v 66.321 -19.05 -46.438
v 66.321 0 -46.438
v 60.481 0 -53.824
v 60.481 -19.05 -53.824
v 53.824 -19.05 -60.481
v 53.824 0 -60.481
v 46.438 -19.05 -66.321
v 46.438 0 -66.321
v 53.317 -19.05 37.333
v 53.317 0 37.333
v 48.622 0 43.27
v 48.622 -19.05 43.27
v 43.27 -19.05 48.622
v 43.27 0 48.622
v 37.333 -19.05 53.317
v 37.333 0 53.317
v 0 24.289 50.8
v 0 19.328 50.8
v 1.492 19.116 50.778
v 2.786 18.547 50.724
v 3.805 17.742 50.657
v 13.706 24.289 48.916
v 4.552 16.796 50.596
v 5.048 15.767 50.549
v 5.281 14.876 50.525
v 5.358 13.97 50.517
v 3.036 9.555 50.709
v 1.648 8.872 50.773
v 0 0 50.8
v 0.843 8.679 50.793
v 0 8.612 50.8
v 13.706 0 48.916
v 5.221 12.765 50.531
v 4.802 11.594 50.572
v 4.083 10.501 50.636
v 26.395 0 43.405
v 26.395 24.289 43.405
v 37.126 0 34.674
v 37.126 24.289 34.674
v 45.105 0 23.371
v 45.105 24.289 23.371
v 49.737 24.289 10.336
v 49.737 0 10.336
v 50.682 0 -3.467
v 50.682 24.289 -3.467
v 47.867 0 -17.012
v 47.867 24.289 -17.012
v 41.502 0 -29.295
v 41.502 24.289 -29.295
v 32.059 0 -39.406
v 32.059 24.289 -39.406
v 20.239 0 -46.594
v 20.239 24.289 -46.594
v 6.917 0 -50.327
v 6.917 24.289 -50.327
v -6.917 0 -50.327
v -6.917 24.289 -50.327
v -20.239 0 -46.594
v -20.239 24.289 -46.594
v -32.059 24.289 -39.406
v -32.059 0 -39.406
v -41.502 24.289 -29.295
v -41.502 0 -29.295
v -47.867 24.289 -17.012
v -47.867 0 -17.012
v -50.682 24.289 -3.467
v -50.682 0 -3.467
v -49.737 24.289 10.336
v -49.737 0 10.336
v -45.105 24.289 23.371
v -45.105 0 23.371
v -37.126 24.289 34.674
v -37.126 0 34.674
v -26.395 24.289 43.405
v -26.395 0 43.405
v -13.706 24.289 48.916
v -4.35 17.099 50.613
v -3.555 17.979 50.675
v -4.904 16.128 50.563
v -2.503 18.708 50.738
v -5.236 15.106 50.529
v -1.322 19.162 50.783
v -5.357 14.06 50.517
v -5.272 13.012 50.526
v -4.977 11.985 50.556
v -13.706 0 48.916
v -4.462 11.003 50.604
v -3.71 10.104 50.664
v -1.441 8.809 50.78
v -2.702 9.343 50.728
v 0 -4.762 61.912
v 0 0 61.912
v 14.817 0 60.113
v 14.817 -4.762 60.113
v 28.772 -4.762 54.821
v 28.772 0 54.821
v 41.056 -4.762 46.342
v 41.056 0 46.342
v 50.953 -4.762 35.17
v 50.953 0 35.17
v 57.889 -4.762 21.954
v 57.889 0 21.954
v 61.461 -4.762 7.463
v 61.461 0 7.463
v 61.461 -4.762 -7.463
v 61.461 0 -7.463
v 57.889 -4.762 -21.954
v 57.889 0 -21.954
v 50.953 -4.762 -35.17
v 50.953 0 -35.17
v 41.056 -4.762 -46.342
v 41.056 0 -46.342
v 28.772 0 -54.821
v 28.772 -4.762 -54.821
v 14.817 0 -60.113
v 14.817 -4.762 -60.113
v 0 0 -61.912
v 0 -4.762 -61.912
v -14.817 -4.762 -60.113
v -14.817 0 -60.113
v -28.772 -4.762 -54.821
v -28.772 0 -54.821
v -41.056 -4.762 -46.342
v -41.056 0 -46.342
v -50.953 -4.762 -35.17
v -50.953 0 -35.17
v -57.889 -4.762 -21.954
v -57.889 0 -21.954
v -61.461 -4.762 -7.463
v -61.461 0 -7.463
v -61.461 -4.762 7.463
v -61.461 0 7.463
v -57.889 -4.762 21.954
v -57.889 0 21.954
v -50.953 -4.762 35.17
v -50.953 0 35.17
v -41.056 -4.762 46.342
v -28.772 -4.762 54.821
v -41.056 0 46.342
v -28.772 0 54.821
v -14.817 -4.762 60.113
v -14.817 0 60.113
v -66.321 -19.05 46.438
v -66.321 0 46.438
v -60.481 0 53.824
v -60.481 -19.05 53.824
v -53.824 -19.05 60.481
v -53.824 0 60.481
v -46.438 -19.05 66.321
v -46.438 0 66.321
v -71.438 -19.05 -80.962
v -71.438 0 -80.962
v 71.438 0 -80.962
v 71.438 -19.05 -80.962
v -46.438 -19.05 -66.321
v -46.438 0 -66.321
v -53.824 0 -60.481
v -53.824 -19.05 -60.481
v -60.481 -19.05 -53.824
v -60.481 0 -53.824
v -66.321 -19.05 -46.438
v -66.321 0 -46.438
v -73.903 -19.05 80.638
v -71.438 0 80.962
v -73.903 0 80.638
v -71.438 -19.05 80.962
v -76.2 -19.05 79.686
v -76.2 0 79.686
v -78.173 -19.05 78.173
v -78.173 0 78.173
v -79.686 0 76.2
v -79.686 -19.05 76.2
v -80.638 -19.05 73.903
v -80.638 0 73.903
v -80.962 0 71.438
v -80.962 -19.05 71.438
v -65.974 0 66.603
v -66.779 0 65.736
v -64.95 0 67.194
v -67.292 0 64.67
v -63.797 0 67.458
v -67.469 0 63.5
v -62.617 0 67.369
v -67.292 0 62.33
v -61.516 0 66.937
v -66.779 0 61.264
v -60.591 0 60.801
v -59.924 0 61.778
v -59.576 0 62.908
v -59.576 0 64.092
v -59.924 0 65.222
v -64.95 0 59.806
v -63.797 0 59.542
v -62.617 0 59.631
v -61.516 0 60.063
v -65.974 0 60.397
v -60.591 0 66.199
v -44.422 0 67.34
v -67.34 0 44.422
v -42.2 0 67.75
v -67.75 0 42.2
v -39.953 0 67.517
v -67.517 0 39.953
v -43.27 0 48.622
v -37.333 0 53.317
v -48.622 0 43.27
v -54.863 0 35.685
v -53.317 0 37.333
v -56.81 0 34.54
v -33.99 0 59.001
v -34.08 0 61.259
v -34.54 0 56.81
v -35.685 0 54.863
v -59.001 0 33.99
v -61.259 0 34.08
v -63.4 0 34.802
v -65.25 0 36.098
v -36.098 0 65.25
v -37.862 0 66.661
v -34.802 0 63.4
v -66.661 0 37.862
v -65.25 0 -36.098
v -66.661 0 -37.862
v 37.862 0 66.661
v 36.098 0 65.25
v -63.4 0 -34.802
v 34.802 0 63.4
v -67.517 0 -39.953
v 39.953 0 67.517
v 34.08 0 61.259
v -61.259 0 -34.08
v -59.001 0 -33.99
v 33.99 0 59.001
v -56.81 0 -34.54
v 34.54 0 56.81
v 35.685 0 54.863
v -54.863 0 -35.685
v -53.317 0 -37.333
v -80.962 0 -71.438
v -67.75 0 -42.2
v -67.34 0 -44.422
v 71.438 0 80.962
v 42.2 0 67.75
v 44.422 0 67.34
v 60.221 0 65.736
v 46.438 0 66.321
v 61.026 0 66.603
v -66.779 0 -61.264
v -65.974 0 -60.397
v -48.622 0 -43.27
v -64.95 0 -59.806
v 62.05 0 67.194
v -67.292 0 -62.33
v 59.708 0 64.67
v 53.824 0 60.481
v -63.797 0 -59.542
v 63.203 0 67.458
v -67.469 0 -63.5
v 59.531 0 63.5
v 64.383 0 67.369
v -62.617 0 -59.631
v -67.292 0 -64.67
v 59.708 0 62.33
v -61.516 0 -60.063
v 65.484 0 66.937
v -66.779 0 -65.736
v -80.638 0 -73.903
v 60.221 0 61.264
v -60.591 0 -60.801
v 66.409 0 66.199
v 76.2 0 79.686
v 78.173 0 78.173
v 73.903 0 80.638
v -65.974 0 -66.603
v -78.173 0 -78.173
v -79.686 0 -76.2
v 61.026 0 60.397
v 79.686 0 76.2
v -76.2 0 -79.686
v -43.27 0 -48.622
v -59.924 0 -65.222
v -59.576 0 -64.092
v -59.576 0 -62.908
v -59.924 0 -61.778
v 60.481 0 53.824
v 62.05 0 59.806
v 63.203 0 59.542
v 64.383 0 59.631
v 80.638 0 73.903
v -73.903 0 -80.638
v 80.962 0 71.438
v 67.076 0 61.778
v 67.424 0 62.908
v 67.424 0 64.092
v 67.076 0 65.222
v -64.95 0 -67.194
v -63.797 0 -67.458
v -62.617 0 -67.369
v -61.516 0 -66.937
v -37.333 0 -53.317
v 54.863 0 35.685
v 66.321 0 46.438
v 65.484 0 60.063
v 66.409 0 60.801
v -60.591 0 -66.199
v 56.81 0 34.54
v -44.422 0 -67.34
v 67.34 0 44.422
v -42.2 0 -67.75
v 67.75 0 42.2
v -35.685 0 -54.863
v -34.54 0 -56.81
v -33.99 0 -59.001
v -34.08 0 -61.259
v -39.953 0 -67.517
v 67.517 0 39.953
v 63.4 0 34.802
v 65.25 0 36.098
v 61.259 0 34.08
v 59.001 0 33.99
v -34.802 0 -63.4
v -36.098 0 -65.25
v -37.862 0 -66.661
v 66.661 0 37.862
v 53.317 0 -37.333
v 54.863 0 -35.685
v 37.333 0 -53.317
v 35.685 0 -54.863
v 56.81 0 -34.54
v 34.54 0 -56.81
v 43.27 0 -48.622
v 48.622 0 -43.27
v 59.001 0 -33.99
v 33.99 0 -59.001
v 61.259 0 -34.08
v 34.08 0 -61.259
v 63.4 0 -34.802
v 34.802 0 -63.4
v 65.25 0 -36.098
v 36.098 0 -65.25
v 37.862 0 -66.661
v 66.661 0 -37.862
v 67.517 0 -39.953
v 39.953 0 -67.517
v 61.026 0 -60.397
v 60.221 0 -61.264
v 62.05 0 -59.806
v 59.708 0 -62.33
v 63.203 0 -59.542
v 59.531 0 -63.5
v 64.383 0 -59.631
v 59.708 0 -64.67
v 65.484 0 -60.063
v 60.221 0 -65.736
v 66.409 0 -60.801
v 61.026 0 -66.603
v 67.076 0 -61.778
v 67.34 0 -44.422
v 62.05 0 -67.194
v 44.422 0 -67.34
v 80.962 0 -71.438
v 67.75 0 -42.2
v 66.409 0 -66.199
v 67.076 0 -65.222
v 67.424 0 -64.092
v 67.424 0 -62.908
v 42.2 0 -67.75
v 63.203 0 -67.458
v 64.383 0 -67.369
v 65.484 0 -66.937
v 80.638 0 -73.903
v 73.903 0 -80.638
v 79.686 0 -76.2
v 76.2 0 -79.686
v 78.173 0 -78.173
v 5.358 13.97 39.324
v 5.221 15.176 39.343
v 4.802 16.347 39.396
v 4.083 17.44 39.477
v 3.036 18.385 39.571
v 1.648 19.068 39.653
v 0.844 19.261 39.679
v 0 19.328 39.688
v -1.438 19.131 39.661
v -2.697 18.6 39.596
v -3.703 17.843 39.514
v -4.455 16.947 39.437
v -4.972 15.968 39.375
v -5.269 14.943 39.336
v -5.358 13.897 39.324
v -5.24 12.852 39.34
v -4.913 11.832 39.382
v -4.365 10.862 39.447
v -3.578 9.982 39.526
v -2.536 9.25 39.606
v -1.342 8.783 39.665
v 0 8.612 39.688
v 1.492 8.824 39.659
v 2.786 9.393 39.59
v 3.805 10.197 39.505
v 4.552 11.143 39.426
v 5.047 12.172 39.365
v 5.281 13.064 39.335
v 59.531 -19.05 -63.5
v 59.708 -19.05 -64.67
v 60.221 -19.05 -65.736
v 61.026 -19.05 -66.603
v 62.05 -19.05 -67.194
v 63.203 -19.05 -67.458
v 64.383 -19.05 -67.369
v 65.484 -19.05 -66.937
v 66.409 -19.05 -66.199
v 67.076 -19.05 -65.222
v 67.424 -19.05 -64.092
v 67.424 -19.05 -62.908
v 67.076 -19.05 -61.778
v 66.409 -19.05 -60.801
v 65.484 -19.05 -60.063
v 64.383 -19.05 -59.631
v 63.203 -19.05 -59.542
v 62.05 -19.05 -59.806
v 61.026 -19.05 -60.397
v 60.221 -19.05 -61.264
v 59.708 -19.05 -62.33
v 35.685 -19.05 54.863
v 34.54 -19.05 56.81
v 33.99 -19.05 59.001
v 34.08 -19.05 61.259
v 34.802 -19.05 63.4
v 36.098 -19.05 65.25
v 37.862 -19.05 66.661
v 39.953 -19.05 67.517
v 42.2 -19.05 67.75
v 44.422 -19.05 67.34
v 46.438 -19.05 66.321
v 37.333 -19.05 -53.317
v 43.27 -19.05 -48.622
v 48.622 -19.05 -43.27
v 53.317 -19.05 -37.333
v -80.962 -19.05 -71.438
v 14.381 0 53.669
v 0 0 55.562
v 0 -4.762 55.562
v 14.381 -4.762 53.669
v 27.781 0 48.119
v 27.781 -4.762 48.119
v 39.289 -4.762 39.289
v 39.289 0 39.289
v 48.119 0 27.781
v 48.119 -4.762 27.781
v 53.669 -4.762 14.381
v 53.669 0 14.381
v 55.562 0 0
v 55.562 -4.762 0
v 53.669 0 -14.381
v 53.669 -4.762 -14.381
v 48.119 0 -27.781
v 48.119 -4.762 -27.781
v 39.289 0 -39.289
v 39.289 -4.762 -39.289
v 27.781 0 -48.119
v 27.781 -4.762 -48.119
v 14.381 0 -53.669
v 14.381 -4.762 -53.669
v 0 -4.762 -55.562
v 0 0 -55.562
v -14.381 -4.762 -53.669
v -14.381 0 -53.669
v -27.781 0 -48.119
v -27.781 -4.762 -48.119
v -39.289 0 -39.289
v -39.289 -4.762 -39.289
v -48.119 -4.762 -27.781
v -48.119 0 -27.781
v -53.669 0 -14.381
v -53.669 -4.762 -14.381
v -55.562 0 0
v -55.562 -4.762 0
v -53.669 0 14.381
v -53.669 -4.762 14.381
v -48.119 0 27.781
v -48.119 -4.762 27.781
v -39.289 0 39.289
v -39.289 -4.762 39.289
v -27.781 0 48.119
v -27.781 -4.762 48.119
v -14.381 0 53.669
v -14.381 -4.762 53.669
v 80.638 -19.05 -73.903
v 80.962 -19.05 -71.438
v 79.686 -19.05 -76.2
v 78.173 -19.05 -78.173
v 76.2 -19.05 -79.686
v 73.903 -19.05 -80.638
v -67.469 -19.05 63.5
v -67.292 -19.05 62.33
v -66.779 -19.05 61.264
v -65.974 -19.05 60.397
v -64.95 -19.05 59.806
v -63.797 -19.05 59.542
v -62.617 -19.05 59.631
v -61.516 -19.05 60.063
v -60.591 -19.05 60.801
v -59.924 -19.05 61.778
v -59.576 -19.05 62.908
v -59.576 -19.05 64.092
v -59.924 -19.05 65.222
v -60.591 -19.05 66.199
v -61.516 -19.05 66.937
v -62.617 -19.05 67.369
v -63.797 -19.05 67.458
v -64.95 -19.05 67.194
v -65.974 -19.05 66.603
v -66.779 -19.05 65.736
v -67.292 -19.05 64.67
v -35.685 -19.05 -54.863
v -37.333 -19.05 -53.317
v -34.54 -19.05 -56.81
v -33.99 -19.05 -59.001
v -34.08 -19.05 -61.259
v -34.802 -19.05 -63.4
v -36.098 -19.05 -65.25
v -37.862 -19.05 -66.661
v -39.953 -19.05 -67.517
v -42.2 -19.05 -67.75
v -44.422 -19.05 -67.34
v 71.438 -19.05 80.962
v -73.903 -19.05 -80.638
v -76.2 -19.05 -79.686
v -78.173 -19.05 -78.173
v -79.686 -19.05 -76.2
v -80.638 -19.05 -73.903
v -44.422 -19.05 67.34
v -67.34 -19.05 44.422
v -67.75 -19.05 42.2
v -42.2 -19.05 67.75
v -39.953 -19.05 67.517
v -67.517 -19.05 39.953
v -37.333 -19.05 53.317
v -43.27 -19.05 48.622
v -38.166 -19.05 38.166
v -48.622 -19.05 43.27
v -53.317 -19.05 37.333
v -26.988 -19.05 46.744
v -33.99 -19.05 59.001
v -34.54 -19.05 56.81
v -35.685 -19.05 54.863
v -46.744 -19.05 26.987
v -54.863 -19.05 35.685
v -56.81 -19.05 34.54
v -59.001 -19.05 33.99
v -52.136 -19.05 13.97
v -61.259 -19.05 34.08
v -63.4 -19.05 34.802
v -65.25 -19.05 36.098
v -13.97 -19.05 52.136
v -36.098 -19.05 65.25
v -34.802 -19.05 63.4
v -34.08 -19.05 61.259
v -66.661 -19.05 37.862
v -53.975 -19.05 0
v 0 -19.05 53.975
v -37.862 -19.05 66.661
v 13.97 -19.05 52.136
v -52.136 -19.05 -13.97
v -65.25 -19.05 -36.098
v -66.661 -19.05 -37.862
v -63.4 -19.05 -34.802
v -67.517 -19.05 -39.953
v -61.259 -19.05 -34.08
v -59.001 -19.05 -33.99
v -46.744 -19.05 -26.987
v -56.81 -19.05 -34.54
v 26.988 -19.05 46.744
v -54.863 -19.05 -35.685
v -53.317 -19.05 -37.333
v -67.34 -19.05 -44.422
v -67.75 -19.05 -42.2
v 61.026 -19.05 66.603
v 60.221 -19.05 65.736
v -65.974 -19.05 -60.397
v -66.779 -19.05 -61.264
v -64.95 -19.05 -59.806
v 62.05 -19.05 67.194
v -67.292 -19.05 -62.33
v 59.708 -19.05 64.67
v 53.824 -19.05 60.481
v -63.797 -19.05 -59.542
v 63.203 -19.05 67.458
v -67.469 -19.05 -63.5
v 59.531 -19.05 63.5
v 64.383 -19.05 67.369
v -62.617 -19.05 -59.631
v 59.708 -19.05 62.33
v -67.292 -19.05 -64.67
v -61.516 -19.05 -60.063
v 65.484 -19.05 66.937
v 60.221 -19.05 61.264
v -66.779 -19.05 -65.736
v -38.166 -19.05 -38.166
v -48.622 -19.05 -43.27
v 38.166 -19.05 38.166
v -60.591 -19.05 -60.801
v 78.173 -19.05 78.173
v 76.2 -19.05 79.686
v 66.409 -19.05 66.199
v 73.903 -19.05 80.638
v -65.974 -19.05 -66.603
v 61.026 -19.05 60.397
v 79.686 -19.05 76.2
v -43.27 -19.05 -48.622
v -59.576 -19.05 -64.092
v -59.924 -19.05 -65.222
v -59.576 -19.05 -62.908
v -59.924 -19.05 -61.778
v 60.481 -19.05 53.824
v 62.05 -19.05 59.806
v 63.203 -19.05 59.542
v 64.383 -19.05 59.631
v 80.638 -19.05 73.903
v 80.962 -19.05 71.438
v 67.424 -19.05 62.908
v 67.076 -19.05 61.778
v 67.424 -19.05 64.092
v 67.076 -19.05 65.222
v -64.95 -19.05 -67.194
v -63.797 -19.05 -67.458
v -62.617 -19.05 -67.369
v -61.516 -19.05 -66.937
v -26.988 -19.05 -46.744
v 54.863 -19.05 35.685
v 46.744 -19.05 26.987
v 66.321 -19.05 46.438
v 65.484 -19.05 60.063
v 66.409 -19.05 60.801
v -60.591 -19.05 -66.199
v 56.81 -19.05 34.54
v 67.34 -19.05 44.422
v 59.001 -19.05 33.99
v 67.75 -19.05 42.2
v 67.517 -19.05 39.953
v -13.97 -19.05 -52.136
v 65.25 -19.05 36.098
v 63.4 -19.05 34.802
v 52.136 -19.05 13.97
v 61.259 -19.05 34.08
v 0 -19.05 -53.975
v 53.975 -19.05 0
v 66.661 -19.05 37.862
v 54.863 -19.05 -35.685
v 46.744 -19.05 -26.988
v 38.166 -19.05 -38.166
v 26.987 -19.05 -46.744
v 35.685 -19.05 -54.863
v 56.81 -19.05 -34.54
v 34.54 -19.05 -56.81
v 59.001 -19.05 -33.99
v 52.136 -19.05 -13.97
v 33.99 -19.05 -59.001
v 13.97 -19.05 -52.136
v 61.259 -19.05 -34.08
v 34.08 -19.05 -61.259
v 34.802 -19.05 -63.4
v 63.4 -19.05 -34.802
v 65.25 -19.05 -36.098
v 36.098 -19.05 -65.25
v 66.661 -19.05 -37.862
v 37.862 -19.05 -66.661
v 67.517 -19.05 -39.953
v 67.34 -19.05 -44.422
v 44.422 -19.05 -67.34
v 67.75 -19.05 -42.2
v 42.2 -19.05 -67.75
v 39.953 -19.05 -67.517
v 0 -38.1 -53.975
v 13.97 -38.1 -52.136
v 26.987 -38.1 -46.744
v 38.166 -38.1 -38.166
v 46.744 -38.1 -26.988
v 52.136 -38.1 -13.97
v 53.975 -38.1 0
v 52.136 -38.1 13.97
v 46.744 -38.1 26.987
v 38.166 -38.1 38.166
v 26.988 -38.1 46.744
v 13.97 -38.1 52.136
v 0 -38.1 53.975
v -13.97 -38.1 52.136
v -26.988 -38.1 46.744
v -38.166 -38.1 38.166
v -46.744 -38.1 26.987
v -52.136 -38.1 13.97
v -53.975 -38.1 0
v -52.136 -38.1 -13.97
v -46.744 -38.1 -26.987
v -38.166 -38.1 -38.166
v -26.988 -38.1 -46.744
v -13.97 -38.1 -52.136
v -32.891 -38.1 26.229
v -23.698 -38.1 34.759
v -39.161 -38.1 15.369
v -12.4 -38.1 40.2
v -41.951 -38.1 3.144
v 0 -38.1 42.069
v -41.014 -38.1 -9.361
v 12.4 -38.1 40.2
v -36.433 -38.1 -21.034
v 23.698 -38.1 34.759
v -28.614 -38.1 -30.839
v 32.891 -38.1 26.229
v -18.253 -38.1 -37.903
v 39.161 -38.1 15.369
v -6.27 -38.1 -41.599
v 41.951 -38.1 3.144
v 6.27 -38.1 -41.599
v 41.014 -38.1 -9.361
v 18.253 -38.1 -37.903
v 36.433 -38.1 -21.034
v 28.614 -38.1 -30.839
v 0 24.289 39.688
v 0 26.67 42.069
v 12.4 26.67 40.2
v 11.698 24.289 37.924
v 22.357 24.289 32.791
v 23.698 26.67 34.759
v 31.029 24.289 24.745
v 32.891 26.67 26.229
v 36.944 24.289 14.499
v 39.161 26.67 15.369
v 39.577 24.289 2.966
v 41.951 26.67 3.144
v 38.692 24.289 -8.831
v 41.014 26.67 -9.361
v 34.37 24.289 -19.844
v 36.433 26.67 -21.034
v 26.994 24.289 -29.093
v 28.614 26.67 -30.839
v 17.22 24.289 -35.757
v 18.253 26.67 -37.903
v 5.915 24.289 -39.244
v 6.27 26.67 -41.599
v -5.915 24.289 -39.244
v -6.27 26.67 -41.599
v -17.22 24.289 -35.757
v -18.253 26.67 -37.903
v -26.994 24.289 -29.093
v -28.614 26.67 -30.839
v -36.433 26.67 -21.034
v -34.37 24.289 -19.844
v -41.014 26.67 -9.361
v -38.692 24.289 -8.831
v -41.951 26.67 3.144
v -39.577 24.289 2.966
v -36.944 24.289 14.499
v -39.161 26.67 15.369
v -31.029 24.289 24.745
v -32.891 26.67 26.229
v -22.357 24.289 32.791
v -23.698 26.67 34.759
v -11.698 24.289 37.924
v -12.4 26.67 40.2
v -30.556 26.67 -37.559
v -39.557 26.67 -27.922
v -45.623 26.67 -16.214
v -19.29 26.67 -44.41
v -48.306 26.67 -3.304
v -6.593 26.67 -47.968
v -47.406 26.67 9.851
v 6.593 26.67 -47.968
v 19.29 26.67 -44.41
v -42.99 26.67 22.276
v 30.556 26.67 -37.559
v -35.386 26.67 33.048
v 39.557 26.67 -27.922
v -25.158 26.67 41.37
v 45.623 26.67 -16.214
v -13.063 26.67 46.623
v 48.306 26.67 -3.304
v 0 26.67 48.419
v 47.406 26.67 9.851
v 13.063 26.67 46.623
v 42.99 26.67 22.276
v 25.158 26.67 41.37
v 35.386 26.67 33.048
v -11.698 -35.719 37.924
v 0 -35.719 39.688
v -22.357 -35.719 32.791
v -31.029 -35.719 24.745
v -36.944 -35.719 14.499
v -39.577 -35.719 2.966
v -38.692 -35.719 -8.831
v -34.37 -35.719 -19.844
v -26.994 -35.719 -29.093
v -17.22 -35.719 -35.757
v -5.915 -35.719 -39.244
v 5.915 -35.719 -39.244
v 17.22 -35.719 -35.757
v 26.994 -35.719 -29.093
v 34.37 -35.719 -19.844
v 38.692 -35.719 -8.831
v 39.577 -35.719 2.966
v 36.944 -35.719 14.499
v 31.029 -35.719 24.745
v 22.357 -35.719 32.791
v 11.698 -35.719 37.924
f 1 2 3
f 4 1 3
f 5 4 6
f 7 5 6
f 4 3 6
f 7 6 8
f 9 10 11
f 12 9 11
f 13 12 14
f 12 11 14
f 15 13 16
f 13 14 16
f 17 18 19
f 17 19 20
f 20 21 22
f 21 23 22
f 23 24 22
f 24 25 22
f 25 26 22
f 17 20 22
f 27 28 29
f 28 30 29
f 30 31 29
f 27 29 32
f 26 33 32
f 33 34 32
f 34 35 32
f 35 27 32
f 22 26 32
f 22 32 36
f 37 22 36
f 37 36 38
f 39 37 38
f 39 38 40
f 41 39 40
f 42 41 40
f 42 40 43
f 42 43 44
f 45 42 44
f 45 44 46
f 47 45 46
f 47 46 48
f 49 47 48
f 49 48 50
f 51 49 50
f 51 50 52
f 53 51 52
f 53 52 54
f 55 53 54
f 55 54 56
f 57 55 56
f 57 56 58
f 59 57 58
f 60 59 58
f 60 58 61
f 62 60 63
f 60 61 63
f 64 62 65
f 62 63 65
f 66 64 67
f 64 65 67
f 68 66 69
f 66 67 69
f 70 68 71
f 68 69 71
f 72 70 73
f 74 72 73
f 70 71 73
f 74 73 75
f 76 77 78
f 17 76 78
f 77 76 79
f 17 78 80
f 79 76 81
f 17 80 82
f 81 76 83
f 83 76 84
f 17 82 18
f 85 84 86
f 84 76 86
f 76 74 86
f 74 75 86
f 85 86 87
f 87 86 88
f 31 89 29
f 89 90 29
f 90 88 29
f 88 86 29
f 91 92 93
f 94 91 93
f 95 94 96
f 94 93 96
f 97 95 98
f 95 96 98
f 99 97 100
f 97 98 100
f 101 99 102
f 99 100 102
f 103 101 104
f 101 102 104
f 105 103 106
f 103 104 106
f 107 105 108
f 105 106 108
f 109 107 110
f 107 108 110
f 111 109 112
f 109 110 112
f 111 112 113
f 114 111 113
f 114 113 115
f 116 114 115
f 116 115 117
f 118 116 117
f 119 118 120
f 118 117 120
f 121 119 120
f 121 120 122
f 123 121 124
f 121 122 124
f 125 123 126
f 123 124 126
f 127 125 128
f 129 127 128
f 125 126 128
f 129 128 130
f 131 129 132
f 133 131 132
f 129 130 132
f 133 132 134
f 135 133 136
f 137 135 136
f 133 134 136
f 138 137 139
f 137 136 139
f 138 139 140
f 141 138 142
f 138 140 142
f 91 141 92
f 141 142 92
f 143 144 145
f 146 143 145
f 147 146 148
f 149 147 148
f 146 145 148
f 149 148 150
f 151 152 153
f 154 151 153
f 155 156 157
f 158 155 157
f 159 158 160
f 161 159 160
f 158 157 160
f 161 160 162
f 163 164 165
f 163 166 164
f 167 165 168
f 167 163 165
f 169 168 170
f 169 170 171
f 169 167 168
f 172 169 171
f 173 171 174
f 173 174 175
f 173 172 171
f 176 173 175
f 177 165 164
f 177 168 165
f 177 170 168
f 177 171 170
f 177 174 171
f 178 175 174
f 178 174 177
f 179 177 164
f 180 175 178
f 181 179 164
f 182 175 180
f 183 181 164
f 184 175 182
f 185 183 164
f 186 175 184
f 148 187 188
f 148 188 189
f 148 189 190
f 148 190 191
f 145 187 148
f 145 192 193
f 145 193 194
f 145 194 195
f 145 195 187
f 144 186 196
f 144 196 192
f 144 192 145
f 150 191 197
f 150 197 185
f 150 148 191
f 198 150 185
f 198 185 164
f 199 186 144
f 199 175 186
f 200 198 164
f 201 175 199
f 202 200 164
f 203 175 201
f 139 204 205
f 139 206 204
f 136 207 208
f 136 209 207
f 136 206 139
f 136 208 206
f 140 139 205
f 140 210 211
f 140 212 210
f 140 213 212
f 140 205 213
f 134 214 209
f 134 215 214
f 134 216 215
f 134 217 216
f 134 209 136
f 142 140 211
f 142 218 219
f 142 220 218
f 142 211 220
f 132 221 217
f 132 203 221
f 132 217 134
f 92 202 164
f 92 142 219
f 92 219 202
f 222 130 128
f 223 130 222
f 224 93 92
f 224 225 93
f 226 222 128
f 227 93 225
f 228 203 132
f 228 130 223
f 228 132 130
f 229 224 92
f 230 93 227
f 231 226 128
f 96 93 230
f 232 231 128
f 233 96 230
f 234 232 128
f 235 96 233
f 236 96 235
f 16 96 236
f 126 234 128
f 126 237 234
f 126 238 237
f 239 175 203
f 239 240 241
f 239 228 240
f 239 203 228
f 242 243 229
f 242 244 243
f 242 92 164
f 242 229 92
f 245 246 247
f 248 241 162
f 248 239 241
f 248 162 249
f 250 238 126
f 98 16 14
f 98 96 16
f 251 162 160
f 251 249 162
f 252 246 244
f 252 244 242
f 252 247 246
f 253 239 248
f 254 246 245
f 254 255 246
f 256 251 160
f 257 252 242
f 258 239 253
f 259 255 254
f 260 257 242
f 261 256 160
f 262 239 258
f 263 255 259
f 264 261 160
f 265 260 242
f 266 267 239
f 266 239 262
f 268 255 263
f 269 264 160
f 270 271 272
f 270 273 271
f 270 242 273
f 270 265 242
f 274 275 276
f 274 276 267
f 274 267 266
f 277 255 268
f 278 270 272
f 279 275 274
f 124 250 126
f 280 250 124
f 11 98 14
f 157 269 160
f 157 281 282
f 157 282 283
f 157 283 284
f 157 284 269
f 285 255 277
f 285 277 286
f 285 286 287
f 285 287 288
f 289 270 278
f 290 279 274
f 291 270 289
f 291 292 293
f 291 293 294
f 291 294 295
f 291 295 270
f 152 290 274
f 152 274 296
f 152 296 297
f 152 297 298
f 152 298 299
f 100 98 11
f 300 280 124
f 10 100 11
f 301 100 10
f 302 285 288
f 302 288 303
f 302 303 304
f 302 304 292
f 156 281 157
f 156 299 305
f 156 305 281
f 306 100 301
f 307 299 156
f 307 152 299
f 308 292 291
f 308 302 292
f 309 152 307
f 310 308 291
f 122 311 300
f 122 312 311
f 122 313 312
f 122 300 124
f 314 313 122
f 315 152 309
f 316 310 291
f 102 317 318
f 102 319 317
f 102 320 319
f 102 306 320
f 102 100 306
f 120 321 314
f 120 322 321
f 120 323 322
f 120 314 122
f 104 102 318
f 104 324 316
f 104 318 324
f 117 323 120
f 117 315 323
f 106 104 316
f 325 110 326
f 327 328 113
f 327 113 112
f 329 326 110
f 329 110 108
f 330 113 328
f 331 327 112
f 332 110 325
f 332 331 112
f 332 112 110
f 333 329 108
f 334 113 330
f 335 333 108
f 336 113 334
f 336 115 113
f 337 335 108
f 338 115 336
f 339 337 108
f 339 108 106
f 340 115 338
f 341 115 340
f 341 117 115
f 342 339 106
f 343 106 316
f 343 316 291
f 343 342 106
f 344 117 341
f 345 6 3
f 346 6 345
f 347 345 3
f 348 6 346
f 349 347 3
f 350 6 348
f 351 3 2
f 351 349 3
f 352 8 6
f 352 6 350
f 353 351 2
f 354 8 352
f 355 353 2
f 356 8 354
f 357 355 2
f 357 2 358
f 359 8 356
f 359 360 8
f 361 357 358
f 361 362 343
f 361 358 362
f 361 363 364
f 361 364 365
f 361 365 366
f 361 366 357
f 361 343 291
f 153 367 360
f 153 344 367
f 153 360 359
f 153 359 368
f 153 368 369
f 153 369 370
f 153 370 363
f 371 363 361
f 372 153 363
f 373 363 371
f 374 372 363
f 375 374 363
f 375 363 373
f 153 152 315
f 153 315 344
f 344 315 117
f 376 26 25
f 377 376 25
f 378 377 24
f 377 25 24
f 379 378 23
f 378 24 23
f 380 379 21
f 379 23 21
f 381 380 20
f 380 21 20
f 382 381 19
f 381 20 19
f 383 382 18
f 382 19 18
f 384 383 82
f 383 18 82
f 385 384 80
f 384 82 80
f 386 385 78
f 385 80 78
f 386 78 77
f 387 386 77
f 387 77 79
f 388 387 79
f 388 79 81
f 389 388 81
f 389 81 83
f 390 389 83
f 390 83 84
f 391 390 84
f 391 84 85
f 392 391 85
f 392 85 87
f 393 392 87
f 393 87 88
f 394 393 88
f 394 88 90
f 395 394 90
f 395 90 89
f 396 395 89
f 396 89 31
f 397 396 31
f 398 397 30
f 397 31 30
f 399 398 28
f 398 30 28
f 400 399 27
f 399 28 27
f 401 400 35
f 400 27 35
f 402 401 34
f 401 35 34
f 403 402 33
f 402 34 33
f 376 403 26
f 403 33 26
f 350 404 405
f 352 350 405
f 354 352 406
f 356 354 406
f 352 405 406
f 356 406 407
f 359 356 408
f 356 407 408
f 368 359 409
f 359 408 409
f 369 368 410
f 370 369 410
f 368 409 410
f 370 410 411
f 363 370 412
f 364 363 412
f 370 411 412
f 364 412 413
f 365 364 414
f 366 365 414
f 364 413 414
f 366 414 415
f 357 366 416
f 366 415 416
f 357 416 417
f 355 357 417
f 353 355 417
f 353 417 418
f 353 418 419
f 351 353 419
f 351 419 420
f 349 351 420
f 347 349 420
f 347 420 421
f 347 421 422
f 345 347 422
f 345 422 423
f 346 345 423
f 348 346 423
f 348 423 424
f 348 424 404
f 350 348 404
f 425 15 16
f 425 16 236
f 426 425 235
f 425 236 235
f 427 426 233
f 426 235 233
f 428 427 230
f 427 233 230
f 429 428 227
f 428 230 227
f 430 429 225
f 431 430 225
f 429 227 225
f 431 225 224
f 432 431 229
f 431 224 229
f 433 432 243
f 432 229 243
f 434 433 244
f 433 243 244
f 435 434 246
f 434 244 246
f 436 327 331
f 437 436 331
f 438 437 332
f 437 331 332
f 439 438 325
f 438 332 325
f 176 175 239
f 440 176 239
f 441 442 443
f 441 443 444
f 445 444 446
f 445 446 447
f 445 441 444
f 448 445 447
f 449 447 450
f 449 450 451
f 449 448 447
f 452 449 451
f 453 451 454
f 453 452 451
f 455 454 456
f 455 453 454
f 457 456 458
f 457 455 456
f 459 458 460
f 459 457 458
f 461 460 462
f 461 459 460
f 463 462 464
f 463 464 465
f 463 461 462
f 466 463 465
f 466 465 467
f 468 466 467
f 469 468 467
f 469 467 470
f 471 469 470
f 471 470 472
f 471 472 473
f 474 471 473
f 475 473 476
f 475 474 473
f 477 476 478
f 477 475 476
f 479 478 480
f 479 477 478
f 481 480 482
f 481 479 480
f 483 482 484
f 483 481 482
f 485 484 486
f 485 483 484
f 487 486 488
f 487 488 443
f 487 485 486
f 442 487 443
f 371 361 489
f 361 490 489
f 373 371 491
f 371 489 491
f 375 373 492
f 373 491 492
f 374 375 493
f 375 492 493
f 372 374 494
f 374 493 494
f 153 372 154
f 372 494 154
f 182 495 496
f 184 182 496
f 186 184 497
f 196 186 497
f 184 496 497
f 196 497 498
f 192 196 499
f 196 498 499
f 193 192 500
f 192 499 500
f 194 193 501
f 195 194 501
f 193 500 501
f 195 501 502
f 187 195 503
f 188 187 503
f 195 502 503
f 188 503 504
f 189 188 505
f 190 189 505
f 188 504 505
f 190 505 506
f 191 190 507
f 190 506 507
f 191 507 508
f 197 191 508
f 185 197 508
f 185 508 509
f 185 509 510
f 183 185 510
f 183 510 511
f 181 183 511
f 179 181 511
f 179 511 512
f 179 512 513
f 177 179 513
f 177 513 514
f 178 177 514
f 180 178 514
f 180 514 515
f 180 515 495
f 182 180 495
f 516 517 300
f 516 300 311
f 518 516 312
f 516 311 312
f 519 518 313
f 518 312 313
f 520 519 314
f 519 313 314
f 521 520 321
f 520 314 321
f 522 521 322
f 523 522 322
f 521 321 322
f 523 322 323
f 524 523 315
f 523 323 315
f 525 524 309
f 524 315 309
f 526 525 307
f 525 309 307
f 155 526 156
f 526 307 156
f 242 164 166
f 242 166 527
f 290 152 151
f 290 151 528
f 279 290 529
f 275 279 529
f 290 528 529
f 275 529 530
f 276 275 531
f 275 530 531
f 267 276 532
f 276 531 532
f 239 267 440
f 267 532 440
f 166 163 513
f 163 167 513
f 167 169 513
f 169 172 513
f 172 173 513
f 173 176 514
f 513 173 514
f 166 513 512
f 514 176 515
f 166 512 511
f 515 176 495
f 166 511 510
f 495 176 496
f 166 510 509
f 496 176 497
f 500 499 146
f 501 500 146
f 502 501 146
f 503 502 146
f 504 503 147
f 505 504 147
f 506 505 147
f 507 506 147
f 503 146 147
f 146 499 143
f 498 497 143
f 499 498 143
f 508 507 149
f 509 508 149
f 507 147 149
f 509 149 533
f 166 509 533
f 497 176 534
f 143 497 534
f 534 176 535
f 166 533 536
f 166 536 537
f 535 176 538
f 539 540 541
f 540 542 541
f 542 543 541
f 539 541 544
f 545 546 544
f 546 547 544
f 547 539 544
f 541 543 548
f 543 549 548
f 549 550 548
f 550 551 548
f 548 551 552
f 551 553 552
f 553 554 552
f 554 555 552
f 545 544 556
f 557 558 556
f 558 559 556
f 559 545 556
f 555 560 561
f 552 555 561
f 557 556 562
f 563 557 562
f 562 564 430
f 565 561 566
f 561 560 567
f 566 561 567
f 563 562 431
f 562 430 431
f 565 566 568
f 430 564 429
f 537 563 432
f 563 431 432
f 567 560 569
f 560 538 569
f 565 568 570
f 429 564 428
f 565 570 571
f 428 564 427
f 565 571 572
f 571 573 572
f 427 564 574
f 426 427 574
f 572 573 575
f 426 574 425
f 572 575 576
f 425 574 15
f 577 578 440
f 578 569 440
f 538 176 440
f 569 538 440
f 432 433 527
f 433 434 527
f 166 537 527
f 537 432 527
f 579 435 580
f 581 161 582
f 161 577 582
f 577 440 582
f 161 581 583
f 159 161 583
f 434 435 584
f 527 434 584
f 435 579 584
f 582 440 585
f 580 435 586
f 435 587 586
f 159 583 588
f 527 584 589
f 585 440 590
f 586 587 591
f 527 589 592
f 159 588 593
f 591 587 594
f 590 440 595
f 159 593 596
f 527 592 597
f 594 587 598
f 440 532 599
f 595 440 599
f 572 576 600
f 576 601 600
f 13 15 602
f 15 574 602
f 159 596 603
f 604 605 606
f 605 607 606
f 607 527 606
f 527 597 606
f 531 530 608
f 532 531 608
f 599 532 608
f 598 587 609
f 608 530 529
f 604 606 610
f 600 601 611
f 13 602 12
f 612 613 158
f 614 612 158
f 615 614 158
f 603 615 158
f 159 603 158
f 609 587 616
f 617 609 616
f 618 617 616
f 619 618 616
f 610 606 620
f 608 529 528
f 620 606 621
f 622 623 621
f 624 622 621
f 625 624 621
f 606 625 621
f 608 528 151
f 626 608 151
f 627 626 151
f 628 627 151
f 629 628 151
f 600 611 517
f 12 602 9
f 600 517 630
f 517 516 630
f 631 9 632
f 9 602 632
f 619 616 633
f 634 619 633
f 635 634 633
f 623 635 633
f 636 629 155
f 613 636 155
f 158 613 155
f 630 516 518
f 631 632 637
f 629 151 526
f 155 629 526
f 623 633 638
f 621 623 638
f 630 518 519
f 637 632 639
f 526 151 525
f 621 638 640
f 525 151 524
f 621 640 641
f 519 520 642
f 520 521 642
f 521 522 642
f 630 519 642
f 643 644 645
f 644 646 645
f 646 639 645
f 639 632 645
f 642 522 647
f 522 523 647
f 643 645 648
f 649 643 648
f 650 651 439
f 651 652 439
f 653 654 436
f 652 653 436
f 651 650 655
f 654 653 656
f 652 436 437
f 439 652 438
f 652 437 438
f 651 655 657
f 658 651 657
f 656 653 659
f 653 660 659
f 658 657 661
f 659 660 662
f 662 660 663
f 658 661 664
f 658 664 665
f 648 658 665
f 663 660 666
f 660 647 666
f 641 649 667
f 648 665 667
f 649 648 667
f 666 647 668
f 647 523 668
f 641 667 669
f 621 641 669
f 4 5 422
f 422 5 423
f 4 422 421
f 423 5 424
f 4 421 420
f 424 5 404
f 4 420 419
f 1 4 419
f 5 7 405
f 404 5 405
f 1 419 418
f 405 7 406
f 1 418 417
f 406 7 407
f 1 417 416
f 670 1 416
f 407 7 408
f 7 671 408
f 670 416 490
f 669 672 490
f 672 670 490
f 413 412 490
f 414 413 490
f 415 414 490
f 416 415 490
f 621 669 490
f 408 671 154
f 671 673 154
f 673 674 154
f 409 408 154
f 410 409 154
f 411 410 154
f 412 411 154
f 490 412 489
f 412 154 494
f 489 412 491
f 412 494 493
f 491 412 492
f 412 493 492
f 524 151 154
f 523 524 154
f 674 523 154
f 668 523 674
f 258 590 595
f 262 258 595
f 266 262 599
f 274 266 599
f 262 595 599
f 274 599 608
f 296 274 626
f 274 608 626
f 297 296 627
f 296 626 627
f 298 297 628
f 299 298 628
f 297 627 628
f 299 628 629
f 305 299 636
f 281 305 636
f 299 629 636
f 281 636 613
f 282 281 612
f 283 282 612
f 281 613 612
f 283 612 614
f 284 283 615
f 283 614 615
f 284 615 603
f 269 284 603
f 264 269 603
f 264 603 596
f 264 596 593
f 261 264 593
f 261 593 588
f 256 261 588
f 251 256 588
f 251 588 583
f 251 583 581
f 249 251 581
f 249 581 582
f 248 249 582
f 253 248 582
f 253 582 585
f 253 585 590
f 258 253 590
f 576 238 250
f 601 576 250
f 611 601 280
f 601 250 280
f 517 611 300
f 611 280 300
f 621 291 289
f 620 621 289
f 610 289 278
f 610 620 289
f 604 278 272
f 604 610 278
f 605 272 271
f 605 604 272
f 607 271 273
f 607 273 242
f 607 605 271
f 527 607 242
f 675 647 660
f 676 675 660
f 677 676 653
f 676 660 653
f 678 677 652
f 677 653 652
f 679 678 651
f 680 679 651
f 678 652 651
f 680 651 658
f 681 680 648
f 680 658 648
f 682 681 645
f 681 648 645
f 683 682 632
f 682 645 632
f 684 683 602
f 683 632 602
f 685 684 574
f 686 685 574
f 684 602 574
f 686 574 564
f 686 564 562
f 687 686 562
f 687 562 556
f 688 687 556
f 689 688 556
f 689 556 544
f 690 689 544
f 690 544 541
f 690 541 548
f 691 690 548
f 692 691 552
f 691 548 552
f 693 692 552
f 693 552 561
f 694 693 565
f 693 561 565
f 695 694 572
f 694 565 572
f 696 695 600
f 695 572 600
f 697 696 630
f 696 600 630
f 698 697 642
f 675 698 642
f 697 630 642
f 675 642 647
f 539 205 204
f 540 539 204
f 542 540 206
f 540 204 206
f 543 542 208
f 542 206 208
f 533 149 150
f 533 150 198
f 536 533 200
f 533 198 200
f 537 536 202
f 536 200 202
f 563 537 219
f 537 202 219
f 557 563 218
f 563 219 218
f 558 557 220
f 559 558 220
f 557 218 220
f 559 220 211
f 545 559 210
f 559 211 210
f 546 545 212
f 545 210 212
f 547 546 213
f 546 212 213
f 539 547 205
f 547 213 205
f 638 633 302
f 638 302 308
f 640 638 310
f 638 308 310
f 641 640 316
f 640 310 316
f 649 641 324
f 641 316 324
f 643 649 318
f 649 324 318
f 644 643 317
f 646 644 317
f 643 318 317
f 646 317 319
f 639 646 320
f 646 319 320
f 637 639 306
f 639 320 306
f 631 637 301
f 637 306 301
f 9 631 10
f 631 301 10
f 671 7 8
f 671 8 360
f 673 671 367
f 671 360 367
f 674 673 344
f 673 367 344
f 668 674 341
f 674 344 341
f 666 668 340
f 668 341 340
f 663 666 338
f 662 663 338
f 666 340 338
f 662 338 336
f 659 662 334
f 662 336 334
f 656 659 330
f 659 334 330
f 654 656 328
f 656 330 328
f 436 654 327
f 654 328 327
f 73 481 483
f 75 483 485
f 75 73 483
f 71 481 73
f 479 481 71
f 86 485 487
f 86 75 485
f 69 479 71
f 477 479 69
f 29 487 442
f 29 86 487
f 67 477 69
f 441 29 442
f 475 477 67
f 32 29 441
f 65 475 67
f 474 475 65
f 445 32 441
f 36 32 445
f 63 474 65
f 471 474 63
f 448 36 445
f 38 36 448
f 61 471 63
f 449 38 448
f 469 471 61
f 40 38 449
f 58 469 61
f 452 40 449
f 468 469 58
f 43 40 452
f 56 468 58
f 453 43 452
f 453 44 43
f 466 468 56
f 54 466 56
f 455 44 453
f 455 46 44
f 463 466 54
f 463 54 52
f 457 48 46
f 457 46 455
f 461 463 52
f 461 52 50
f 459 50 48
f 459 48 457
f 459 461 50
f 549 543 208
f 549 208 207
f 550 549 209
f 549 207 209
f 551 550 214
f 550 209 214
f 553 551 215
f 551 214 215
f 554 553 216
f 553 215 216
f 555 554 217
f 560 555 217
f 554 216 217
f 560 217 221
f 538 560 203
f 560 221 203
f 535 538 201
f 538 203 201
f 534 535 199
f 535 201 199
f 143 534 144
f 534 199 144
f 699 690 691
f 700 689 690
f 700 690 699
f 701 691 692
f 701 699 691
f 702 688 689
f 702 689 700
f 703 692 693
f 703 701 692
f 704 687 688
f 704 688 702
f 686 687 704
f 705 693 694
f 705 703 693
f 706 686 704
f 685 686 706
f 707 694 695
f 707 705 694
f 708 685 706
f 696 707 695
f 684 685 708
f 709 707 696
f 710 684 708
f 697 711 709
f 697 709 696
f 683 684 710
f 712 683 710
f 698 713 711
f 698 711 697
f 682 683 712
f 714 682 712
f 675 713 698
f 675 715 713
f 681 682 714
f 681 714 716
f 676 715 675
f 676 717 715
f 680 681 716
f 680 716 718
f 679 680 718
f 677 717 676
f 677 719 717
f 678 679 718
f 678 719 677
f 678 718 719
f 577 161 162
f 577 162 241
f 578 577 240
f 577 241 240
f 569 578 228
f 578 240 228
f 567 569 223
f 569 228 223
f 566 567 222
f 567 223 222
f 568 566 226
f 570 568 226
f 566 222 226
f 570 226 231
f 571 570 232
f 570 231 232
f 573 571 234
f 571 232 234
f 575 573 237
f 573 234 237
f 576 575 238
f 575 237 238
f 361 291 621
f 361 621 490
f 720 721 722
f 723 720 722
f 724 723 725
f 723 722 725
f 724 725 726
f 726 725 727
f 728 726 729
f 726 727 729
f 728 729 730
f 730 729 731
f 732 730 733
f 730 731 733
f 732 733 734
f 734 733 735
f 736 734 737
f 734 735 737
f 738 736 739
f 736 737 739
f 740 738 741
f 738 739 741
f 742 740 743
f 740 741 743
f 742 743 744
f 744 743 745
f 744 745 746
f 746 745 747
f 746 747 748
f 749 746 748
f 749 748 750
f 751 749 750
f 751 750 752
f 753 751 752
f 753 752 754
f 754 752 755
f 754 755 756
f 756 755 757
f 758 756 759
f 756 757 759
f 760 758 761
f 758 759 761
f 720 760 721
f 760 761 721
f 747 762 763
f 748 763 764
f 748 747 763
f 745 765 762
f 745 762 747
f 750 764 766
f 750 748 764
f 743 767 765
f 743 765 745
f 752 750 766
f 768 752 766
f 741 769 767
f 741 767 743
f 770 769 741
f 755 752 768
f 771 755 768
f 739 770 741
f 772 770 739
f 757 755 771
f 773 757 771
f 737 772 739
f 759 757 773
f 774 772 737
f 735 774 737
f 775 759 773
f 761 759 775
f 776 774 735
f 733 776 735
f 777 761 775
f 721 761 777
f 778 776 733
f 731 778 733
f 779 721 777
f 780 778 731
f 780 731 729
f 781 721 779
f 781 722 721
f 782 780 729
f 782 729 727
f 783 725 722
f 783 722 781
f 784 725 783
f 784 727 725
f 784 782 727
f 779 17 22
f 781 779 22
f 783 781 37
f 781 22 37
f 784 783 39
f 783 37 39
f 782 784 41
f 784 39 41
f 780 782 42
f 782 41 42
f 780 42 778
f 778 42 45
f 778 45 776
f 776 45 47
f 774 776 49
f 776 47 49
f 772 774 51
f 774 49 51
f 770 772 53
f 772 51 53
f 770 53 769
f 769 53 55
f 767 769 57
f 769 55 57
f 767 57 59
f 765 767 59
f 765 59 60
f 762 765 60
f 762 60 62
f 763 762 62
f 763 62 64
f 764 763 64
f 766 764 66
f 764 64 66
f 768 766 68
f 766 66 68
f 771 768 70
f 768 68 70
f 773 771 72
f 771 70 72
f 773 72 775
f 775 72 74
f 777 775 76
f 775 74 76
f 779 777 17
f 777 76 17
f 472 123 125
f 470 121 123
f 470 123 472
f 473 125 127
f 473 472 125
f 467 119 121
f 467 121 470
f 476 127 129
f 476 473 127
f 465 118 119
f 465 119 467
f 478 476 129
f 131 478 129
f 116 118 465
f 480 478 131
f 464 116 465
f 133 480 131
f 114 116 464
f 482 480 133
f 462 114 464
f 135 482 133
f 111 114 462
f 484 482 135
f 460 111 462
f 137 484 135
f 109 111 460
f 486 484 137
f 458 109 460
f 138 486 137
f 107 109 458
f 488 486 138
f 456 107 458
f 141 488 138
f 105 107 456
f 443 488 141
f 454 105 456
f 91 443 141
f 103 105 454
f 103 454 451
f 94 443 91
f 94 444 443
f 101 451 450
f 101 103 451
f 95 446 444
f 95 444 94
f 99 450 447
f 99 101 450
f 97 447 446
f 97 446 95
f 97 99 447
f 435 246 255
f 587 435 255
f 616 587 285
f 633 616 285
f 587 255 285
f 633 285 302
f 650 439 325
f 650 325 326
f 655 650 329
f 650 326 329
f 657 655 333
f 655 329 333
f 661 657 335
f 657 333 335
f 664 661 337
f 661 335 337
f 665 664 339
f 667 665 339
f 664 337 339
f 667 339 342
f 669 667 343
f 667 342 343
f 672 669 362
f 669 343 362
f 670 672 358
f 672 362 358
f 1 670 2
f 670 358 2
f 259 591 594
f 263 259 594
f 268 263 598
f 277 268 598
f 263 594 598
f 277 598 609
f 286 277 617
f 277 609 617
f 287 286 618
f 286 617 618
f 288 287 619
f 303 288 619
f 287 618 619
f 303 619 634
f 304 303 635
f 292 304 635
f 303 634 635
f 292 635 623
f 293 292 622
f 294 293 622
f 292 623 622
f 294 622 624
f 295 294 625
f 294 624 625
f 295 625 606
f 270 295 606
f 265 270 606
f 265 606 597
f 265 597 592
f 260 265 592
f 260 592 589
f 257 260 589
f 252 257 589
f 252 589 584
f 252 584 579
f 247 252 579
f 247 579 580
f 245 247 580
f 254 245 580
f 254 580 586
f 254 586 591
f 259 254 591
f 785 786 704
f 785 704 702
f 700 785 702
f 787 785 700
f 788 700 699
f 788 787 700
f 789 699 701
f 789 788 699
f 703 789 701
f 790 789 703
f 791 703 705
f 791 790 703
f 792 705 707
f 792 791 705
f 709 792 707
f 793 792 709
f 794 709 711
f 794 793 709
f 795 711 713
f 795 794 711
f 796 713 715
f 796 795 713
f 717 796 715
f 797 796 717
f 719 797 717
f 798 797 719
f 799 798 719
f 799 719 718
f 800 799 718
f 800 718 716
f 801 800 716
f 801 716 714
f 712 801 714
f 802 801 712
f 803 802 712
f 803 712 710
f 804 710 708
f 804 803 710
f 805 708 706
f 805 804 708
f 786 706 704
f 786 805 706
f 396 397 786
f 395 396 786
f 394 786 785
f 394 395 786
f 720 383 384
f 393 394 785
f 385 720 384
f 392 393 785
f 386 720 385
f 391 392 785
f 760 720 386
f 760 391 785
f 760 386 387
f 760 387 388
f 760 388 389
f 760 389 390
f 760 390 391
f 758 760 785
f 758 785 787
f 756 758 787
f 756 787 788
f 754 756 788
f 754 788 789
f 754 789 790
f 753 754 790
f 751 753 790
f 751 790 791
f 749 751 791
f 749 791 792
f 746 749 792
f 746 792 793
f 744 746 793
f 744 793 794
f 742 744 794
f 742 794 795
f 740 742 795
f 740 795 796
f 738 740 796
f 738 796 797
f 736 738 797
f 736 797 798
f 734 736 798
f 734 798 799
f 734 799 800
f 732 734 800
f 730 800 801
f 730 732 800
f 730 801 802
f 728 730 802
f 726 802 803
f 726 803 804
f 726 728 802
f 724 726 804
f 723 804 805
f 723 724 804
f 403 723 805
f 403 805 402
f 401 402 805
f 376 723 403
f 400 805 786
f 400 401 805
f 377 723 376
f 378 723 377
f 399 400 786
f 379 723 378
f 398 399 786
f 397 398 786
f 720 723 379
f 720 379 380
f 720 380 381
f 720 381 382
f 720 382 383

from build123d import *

# Parameters (mm, degrees)
ESQUISSE1_W                = 161.925
ESQUISSE1_H                = 161.925
ESQUISSE1_R                = 39.6875
BOSS_EXTRU_1_DEPTH         = 19.05
TROU_TARAUD_3_8_161_D      = 7.9375
ESQUISSE4_R                = 61.9125
ESQUISSE4_R_2              = 55.5625
ENL_V_MAT_EXTRU_1_DEPTH    = 4.7625
ESQUISSE5_R                = 50.8
ESQUISSE5_R_2              = 39.6875
BOSS_EXTRU_2_DEPTH         = 26.67
CONG_1_R                   = 9.525
TROU_TARAUD_1_2_131_REACH  = 158.932
TROU_TARAUD_1_2_131_BORE_R = 5.35813
CHANFREIN2_SIZE            = 2.38125
ESQUISSE11_R               = 53.975
ESQUISSE11_R_2             = 39.6875
BOSS_EXTRU_3_DEPTH         = 19.05
CHANFREIN4_SIZE            = 2.38125


with BuildPart() as part:
    # Esquisse1 → Boss.-Extru.1 (new body)
    with BuildSketch(Plane(origin=(0, 0, 0), x_dir=(1, 0, 0), z_dir=(0, 1, 0))):
        Rectangle(ESQUISSE1_W, ESQUISSE1_H)
        with Locations(Location((0, 0, 0), (0, 0, 270))):
            Circle(ESQUISSE1_R, mode=Mode.SUBTRACT)
        with BuildLine():
            ThreePointArc((-46.438182228, 66.320597386), (-57.249132772, 57.249132772), (-66.320597386, 46.438182228))
            ThreePointArc((-66.320597386, 46.438182228), (-64.371340998, 35.383399913), (-53.316558683, 37.332656301))
            ThreePointArc((-53.316558683, 37.332656301), (-46.02381262, 46.02381262), (-37.332656301, 53.316558683))
            ThreePointArc((-37.332656301, 53.316558683), (-35.383399913, 64.371340998), (-46.438182228, 66.320597386))
        make_face(mode=Mode.SUBTRACT)
        with BuildLine():
            ThreePointArc((66.320597386, 46.438182228), (57.249132772, 57.249132772), (46.438182228, 66.320597386))
            ThreePointArc((46.438182228, 66.320597386), (35.383399913, 64.371340998), (37.332656301, 53.316558683))
            ThreePointArc((37.332656301, 53.316558683), (46.02381262, 46.02381262), (53.316558683, 37.332656301))
            ThreePointArc((53.316558683, 37.332656301), (64.371340998, 35.383399913), (66.320597386, 46.438182228))
        make_face(mode=Mode.SUBTRACT)
        with BuildLine():
            ThreePointArc((46.438182228, -66.320597386), (57.249132772, -57.249132772), (66.320597386, -46.438182228))
            ThreePointArc((66.320597386, -46.438182228), (64.371340998, -35.383399913), (53.316558683, -37.332656301))
            ThreePointArc((53.316558683, -37.332656301), (46.02381262, -46.02381262), (37.332656301, -53.316558683))
            ThreePointArc((37.332656301, -53.316558683), (35.383399913, -64.371340998), (46.438182228, -66.320597386))
        make_face(mode=Mode.SUBTRACT)
        with BuildLine():
            ThreePointArc((-66.320597386, -46.438182228), (-57.249132772, -57.249132772), (-46.438182228, -66.320597386))
            ThreePointArc((-46.438182228, -66.320597386), (-35.383399913, -64.371340998), (-37.332656301, -53.316558683))
            ThreePointArc((-37.332656301, -53.316558683), (-46.02381262, -46.02381262), (-53.316558683, -37.332656301))
            ThreePointArc((-53.316558683, -37.332656301), (-64.371340998, -35.383399913), (-66.320597386, -46.438182228))
        make_face(mode=Mode.SUBTRACT)
    extrude(amount=-BOSS_EXTRU_1_DEPTH)

    # Trou taraudé 3/8-161 (through all)
    with Locations(Plane(origin=(0, 0, 0), x_dir=(1, 0, 0), z_dir=(0, 1, 0))):
        with Locations((-63.5, 63.5), (63.5, 63.5), (-63.5, -63.5), (63.5, -63.5)):
            Hole(TROU_TARAUD_3_8_161_D / 2)

    # Esquisse4 → Enlèv. mat.-Extru.1 (cut)
    with BuildSketch(Plane(origin=(0, 0, 0), x_dir=(1, 0, 0), z_dir=(0, 1, 0))):
        with Locations(Location((0, 0, 0), (0, 0, 270))):
            Circle(ESQUISSE4_R)
        with Locations(Location((0, 0, 0), (0, 0, 270))):
            Circle(ESQUISSE4_R_2, mode=Mode.SUBTRACT)
    extrude(amount=-ENL_V_MAT_EXTRU_1_DEPTH, mode=Mode.SUBTRACT)

    # Esquisse5 → Boss.-Extru.2 (add)
    with BuildSketch(Plane(origin=(0, 0, 0), x_dir=(1, 0, 0), z_dir=(0, 1, 0))):
        with Locations(Location((0, 0, 0), (0, 0, 270))):
            Circle(ESQUISSE5_R)
        with Locations(Location((0, 0, 0), (0, 0, 270))):
            Circle(ESQUISSE5_R_2, mode=Mode.SUBTRACT)
    extrude(amount=BOSS_EXTRU_2_DEPTH)

    # Congé1
    cong_1_edges = [part.edges().sort_by_distance(p)[0] for p in [
        (80.9625, -9.525, 80.9625),
        (-80.9625, -9.525, 80.9625),
        (-80.9625, -9.525, -80.9625),
        (80.9625, -9.525, -80.9625),
    ]]
    fillet(cong_1_edges, radius=CONG_1_R)

    # Trou taraudé 1/2-131 bore → Trou taraudé 1/2-131 (cut, up to next)
    with BuildSketch(Plane.XY.offset(50.8), mode=Mode.PRIVATE) as trou_taraud_1_2_131_sk1:
        with Locations((0, 13.97)):
            Circle(TROU_TARAUD_1_2_131_BORE_R)
    trou_taraud_1_2_131_tool1 = extrude(trou_taraud_1_2_131_sk1.sketch, amount=-TROU_TARAUD_1_2_131_REACH, mode=Mode.PRIVATE) & part.part
    add(trou_taraud_1_2_131_tool1.solids().sort_by_distance((0, 13.97, 50.8))[0], mode=Mode.SUBTRACT)

    # Chanfrein2
    chanfrein2_edges = [part.edges().sort_by_distance(p)[0] for p in [
        (0, 26.67, -50.8),
        (0, 26.67, -39.6875),
    ]]
    chamfer(chanfrein2_edges, length=CHANFREIN2_SIZE)

    # Esquisse11 → Boss.-Extru.3 (add)
    with BuildSketch(Plane(origin=(0, -19.05, 0), x_dir=(-1, 0, 0), z_dir=(0, -1, 0))):
        with Locations(Location((0, 0, 0), (0, 0, 90))):
            Circle(ESQUISSE11_R)
        with Locations(Location((0, 0, 0), (0, 0, 270))):
            Circle(ESQUISSE11_R_2, mode=Mode.SUBTRACT)
    extrude(amount=BOSS_EXTRU_3_DEPTH)

    # Chanfrein4
    chanfrein4_edges = [part.edges().sort_by_distance(p)[0] for p in [
        (0, -38.1, -39.6875),
    ]]
    chamfer(chanfrein4_edges, length=CHANFREIN4_SIZE)


solid = part.part
